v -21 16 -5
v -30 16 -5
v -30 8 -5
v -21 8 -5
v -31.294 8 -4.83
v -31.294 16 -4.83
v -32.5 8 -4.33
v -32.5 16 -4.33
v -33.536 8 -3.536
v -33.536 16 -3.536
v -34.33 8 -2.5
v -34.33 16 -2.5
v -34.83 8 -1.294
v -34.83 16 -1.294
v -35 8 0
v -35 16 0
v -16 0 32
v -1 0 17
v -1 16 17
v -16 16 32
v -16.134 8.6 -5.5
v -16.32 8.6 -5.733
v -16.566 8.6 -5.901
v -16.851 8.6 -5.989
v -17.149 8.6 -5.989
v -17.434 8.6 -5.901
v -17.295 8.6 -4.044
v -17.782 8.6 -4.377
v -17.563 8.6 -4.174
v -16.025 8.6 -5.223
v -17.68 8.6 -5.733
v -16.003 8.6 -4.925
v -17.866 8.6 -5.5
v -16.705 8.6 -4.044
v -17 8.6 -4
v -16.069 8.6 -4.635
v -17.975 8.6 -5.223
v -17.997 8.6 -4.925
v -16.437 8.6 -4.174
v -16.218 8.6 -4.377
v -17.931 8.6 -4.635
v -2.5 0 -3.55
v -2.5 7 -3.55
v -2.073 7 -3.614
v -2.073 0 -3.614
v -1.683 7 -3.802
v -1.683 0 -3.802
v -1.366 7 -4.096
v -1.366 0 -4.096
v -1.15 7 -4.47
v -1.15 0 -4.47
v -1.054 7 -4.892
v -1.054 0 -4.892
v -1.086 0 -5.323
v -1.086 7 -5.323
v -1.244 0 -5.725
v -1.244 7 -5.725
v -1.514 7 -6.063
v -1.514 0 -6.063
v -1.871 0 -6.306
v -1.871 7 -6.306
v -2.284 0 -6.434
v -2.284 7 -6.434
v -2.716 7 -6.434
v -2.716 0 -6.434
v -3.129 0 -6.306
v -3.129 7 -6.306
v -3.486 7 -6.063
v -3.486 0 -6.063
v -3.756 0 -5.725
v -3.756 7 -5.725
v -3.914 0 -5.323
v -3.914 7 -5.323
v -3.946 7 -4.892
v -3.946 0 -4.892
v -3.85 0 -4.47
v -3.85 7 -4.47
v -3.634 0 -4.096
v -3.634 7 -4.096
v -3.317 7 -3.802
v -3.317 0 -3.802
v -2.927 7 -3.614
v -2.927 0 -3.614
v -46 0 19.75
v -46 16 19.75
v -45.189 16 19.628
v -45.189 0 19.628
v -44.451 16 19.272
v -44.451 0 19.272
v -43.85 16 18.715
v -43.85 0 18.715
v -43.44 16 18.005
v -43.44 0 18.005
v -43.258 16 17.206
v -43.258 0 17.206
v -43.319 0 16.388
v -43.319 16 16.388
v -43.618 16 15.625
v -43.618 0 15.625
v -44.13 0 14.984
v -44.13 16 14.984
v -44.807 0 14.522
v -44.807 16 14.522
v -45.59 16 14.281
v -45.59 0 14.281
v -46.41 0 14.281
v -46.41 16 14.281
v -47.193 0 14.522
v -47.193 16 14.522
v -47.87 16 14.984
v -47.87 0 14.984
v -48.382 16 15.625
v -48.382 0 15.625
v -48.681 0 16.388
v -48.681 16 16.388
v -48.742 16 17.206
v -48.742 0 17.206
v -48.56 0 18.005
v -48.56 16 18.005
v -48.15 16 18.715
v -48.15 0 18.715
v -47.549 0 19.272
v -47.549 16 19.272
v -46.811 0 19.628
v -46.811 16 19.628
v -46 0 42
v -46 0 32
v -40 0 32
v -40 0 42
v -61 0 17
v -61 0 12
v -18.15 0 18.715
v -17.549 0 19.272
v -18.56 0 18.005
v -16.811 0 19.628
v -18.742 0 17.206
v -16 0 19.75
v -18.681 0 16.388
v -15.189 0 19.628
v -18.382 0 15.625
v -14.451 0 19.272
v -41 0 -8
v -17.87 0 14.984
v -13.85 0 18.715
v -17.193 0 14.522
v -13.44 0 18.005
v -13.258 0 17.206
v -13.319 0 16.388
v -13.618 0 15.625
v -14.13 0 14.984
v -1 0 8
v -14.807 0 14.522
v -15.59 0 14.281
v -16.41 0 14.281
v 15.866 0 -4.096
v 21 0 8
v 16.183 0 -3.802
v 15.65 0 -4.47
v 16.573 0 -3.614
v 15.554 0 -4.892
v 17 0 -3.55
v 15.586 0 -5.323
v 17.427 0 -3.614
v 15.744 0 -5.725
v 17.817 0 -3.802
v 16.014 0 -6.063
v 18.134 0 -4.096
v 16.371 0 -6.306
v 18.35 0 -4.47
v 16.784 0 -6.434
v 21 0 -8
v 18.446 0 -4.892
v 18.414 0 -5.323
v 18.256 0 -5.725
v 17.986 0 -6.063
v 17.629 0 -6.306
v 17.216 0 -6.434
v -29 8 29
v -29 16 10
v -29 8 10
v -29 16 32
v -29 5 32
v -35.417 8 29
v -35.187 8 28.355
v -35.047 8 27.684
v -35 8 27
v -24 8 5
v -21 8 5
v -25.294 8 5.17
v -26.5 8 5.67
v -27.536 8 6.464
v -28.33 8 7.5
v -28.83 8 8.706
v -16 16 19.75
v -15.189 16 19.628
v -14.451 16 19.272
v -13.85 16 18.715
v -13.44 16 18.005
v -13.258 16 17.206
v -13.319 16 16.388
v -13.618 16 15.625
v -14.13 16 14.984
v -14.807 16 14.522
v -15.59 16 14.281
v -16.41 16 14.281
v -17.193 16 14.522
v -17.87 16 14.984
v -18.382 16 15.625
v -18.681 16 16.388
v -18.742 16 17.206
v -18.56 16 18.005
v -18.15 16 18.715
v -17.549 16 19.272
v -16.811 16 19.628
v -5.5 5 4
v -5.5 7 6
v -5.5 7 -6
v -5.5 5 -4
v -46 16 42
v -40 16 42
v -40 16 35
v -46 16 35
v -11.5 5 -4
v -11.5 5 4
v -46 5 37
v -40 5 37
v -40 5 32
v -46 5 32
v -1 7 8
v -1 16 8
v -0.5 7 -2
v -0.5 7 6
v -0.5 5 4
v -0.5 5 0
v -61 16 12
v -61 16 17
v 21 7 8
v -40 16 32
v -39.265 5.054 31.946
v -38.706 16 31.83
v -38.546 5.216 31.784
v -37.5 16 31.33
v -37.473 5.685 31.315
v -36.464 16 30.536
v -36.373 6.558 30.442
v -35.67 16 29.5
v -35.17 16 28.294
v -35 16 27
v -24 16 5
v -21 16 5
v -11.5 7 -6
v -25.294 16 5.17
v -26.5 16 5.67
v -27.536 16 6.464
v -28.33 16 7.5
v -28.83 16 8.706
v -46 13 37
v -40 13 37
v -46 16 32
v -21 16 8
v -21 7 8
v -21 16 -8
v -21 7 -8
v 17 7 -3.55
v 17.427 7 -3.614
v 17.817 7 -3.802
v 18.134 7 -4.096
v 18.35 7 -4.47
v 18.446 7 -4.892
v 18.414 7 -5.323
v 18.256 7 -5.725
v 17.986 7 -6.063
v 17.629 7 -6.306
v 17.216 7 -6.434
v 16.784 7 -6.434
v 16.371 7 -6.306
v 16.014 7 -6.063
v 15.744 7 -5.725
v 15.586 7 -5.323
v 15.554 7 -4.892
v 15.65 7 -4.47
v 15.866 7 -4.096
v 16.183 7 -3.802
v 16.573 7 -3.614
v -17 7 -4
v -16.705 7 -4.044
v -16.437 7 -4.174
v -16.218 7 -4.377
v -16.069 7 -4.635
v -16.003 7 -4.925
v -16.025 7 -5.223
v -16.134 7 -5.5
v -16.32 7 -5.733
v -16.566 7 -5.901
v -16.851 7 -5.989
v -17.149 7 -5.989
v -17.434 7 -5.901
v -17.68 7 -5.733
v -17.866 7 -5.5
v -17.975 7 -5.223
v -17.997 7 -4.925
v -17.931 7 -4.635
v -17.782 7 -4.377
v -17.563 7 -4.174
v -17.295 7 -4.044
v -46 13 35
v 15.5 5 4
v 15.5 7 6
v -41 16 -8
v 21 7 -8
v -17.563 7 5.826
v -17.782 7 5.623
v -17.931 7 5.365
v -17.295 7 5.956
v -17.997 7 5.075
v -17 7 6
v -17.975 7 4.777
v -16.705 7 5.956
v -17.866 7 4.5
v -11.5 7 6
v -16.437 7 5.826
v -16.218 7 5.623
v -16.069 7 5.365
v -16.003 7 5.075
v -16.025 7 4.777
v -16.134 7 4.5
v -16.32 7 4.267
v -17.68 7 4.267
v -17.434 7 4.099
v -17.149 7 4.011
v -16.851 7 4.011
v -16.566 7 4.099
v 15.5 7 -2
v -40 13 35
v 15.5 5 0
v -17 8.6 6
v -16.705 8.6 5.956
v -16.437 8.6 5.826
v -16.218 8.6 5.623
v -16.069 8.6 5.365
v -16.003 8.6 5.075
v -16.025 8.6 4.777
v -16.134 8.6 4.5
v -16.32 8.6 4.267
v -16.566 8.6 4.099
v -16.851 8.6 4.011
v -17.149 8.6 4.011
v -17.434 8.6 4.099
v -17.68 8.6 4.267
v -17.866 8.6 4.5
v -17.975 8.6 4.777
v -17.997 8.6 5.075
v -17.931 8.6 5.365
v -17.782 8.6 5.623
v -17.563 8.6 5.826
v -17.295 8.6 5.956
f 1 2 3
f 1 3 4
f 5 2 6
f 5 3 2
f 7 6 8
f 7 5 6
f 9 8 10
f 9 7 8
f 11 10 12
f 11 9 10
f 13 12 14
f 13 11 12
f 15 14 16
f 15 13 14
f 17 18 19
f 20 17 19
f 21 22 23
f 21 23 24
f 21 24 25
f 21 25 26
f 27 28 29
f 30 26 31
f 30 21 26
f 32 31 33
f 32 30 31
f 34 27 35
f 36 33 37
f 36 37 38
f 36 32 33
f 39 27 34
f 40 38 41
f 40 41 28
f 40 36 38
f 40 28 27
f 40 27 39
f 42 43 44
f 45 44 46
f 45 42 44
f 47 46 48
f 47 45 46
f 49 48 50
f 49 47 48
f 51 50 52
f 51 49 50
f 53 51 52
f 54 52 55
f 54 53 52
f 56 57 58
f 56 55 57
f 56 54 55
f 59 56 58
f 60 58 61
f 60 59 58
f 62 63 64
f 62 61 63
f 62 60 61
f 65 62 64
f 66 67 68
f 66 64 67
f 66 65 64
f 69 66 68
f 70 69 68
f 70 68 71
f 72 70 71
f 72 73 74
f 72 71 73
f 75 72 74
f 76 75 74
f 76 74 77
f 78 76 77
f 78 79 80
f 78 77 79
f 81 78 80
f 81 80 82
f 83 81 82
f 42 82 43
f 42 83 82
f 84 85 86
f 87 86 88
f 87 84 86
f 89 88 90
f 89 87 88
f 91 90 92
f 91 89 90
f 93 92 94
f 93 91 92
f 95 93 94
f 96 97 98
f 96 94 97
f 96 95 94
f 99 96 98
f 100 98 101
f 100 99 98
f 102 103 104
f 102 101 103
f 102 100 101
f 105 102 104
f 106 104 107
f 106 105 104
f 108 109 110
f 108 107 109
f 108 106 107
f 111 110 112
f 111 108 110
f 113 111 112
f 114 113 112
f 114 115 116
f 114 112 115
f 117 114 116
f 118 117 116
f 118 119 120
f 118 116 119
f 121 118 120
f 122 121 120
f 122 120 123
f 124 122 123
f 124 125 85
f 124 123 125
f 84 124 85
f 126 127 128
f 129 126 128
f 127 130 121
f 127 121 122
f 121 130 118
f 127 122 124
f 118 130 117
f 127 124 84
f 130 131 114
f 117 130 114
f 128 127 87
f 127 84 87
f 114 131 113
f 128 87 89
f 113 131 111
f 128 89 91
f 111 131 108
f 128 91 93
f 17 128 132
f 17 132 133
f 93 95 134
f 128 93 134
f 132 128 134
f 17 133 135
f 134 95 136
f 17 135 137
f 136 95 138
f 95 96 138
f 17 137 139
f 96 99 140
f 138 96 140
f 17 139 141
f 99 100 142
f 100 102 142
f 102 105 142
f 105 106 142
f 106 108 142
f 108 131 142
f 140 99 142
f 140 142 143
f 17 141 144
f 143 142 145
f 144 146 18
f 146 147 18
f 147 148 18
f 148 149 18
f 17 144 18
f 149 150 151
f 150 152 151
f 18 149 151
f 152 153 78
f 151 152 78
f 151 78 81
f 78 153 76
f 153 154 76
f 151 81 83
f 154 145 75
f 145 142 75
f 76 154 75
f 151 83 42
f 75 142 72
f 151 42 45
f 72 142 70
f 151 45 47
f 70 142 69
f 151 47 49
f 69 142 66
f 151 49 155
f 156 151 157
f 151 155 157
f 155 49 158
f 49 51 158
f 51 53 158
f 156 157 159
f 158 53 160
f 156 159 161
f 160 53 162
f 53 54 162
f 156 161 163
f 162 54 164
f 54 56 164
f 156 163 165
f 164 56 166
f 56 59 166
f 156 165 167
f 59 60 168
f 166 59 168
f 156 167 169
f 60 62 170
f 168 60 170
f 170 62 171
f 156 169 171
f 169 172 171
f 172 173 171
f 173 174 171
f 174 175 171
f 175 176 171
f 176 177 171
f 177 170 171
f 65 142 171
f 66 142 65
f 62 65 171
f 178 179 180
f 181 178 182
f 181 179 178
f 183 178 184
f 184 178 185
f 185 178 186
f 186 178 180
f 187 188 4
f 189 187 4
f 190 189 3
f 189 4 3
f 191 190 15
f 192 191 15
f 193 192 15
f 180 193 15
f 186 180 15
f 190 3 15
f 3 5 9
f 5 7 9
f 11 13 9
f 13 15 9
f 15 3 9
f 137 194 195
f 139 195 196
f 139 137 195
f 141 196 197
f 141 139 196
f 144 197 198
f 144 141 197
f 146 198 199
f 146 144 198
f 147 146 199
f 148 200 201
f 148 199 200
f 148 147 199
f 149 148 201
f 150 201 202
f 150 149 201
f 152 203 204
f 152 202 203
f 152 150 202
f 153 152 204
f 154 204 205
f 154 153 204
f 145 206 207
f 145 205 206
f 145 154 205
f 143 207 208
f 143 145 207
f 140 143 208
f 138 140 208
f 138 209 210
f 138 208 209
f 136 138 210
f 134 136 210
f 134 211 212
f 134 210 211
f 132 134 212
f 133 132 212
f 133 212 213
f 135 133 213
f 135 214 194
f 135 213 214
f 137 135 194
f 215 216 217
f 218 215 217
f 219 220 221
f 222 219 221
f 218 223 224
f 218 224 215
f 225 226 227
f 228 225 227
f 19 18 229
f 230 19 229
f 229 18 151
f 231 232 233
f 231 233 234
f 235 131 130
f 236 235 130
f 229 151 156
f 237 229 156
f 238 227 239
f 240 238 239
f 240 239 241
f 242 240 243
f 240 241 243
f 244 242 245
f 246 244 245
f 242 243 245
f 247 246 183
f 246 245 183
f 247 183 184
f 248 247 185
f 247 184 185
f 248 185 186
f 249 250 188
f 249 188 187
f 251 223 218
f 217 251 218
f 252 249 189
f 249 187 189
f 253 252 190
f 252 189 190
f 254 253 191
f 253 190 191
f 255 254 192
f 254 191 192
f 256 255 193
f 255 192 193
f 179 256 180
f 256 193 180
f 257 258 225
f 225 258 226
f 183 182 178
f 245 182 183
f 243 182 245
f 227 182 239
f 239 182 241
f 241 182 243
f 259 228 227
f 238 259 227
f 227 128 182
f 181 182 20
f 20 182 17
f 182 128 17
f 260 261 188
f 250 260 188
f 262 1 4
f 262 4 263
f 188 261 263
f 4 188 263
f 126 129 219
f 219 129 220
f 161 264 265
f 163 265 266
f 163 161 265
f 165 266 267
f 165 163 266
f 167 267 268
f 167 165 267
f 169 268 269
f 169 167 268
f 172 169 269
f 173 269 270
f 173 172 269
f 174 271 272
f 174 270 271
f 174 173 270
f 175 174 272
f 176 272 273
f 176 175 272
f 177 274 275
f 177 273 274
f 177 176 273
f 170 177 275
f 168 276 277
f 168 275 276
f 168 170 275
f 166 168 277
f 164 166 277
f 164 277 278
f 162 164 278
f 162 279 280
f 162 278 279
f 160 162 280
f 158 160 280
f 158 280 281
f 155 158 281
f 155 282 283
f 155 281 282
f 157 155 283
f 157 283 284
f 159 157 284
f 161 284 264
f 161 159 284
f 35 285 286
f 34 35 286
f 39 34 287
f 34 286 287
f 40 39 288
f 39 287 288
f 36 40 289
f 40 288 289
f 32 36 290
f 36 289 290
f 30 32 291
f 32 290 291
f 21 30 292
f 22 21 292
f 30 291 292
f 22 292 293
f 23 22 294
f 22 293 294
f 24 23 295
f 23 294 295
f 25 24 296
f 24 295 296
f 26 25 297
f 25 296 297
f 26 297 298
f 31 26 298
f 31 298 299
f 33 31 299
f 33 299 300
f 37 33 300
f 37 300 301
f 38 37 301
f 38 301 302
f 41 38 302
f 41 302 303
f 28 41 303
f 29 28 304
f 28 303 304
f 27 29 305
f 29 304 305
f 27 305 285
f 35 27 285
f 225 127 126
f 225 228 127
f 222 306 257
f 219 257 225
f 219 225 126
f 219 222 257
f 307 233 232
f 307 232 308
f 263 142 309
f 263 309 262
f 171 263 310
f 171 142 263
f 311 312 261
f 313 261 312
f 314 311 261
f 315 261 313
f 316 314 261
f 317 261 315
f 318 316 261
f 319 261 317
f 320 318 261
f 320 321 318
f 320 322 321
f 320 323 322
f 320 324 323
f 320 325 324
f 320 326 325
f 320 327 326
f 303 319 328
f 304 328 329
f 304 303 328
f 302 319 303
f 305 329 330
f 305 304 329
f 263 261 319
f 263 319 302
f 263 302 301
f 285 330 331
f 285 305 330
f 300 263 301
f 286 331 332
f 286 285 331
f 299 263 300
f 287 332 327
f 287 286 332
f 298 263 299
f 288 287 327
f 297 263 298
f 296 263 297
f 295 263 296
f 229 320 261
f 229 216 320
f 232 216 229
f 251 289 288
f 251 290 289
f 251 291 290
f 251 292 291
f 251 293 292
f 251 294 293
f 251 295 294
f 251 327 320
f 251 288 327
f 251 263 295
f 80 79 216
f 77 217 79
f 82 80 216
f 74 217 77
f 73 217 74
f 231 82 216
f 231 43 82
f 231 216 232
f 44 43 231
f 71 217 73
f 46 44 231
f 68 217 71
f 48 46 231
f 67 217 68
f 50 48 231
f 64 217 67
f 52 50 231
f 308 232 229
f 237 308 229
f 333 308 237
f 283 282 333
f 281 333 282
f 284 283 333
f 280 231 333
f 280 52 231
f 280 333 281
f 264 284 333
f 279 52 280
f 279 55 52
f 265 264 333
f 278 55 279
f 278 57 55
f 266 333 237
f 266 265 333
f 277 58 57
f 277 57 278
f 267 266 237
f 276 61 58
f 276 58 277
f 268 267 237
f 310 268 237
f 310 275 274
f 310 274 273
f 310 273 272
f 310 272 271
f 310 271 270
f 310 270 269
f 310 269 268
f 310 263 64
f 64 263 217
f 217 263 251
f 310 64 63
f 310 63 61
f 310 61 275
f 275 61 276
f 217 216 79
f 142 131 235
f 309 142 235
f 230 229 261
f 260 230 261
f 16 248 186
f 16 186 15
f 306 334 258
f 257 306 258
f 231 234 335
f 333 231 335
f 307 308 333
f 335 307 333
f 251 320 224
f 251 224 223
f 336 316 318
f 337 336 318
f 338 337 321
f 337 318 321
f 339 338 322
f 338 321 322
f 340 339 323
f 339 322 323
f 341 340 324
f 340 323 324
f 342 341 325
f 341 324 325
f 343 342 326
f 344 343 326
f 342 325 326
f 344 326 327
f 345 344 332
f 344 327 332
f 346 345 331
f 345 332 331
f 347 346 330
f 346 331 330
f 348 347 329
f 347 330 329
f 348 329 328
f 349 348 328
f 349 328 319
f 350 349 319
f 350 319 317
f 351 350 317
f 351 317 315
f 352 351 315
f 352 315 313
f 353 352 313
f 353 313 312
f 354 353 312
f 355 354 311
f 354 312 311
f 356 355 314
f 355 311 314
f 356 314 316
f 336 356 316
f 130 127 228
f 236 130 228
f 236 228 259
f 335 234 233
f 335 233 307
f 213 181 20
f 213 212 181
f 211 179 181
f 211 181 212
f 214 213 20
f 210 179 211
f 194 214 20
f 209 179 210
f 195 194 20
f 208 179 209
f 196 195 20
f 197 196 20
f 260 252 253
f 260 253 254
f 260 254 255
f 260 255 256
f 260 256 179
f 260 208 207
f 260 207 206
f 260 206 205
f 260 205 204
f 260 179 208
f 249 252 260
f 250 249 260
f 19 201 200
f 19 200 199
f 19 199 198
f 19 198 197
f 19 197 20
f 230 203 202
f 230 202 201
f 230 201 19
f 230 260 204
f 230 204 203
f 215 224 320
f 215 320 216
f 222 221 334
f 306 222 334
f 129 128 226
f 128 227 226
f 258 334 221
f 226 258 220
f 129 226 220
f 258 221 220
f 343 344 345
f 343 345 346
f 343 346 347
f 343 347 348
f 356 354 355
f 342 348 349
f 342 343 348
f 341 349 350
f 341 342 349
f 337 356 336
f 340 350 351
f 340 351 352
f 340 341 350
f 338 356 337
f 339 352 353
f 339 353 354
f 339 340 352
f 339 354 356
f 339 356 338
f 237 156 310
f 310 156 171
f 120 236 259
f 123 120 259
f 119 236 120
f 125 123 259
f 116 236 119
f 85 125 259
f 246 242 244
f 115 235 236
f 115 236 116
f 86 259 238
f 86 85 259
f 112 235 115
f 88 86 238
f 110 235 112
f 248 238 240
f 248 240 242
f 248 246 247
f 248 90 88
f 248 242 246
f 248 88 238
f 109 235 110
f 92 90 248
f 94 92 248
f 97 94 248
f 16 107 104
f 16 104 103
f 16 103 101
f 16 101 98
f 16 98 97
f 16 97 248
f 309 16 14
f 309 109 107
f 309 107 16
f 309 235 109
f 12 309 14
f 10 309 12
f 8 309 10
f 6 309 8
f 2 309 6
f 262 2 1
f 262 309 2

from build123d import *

# Parameters (mm, degrees)
SKETCH1_W           = 42
SKETCH1_H           = 16
BOSS_EXTRUDE1_DEPTH = 7
SKETCH2_R           = 1
BOSS_EXTRUDE2_DEPTH = 1.6
CUT_EXTRUDE1_REACH  = 26.062
SKETCH3_R           = 1.45
BOSS_EXTRUDE3_DEPTH = 16
CUT_EXTRUDE2_REACH  = 72.718
SKETCH5_R           = 2.75
BOSS_EXTRUDE4_DEPTH = 6
CUT_EXTRUDE3_DEPTH  = 8
FILLET1_R           = 5
CHAMFER2_SIZE       = 3
CHAMFER3_SIZE       = 15
CHAMFER5_SIZE       = 20
SKETCH8_W           = 16
SKETCH8_H           = 4
SKETCH8_W_2         = 6
SKETCH8_H_2         = 10
CUT_EXTRUDE4_DEPTH  = 2
CHAMFER6_SIZE       = 2


with BuildPart() as part:
    # Sketch1 → Boss-Extrude1 (new body)
    with BuildSketch(Plane(origin=(0, 0, 0), x_dir=(1, 0, 0), z_dir=(0, 1, 0))):
        Rectangle(SKETCH1_W, SKETCH1_H)
    extrude(amount=BOSS_EXTRUDE1_DEPTH)

    # Sketch2 → Boss-Extrude2 (add)
    with BuildSketch(Plane(origin=(0, 7, 0), x_dir=(1, 0, 0), z_dir=(0, 1, 0))):
        with Locations(Location((-17, 5, 0), (0, 0, 270))):
            Circle(SKETCH2_R)
        with Locations(Location((-17, -5, 0), (0, 0, 270))):
            Circle(SKETCH2_R)
    extrude(amount=BOSS_EXTRUDE2_DEPTH)

    # Sketch3 → Cut-Extrude1 (cut, up to next)
    with BuildSketch(Plane(origin=(0, 0, 0), x_dir=(1, 0, 0), z_dir=(0, 1, 0)), mode=Mode.PRIVATE) as cut_extrude1_sk1:
        with Locations(Location((-2.5, 5, 0), (0, 0, 270))):
            Circle(SKETCH3_R)
    cut_extrude1_tool1 = extrude(cut_extrude1_sk1.sketch, amount=CUT_EXTRUDE1_REACH, mode=Mode.PRIVATE) & part.part
    # Sketch3 → Cut-Extrude1 (cut, up to next)
    with BuildSketch(Plane(origin=(0, 0, 0), x_dir=(1, 0, 0), z_dir=(0, 1, 0)), mode=Mode.PRIVATE) as cut_extrude1_sk2:
        with Locations(Location((17, 5, 0), (0, 0, 270))):
            Circle(SKETCH3_R)
    cut_extrude1_tool2 = extrude(cut_extrude1_sk2.sketch, amount=CUT_EXTRUDE1_REACH, mode=Mode.PRIVATE) & part.part
    add(cut_extrude1_tool1.solids().sort_by_distance((-2.5, 0, -5))[0], mode=Mode.SUBTRACT)
    add(cut_extrude1_tool2.solids().sort_by_distance((17, 0, -5))[0], mode=Mode.SUBTRACT)

    # Sketch4 → Boss-Extrude3 (add)
    with BuildSketch(Plane(origin=(0, 0, 0), x_dir=(1, 0, 0), z_dir=(0, 1, 0))):
        Polygon((-1, -8), (-21, -8), (-21, 8), (-61, 8), (-61, -32), (-1, -32), align=None)
    extrude(amount=BOSS_EXTRUDE3_DEPTH)

    # Sketch5 → Cut-Extrude2 (cut, up to next)
    with BuildSketch(Plane(origin=(0, 0, 0), x_dir=(1, 0, 0), z_dir=(0, 1, 0)), mode=Mode.PRIVATE) as cut_extrude2_sk1:
        with Locations(Location((-46, -17, 0), (0, 0, 270))):
            Circle(SKETCH5_R)
    cut_extrude2_tool1 = extrude(cut_extrude2_sk1.sketch, amount=CUT_EXTRUDE2_REACH, mode=Mode.PRIVATE) & part.part
    # Sketch5 → Cut-Extrude2 (cut, up to next)
    with BuildSketch(Plane(origin=(0, 0, 0), x_dir=(1, 0, 0), z_dir=(0, 1, 0)), mode=Mode.PRIVATE) as cut_extrude2_sk2:
        with Locations(Location((-16, -17, 0), (0, 0, 270))):
            Circle(SKETCH5_R)
    cut_extrude2_tool2 = extrude(cut_extrude2_sk2.sketch, amount=CUT_EXTRUDE2_REACH, mode=Mode.PRIVATE) & part.part
    add(cut_extrude2_tool1.solids().sort_by_distance((-46, 0, 17))[0], mode=Mode.SUBTRACT)
    add(cut_extrude2_tool2.solids().sort_by_distance((-16, 0, 17))[0], mode=Mode.SUBTRACT)

    # Sketch6 → Boss-Extrude4 (add)
    with BuildSketch(Plane(origin=(-40, 0, 0), x_dir=(0, 0, -1), z_dir=(1, 0, 0))):
        Polygon((-32, 0), (-42, 0), (-42, 16), (-35, 16), (-35, 13), (-37, 13), (-37, 5), (-32, 5), align=None)
    extrude(amount=-BOSS_EXTRUDE4_DEPTH)

    # Sketch7 → Cut-Extrude3 (cut)
    with BuildSketch(Plane(origin=(0, 16, 0), x_dir=(1, 0, 0), z_dir=(0, 1, 0))):
        Polygon((-21, 5), (-21, -5), (-29, -5), (-29, -32), (-35, -32), (-35, 5), align=None)
    extrude(amount=-CUT_EXTRUDE3_DEPTH, mode=Mode.SUBTRACT)

    # Fillet1
    fillet1_edges = [part.edges().sort_by_distance(p)[0] for p in [
        (-35, 12, -5),
        (-29, 12, 5),
        (-35, 12, 32),
    ]]
    fillet(fillet1_edges, radius=FILLET1_R)

    # Chamfer2
    chamfer2_edges = [part.edges().sort_by_distance(p)[0] for p in [
        (-34.5, 8, 32),
    ]]
    chamfer(chamfer2_edges, length=CHAMFER2_SIZE)

    # Chamfer3
    chamfer3_edges = [part.edges().sort_by_distance(p)[0] for p in [
        (-1, 8, 32),
        (-61, 8, 32),
    ]]
    chamfer(chamfer3_edges, length=CHAMFER3_SIZE)

    # Chamfer5
    chamfer5_edges = [part.edges().sort_by_distance(p)[0] for p in [
        (-61, 8, -8),
    ]]
    chamfer(chamfer5_edges, length=CHAMFER5_SIZE)

    # Sketch8 → Cut-Extrude4 (cut)
    with BuildSketch(Plane(origin=(0, 7, 0), x_dir=(1, 0, 0), z_dir=(0, 1, 0))):
        with Locations((7.5, -2)):
            Rectangle(SKETCH8_W, SKETCH8_H)
        with Locations((-8.5, 1)):
            Rectangle(SKETCH8_W_2, SKETCH8_H_2)
    extrude(amount=-CUT_EXTRUDE4_DEPTH, mode=Mode.SUBTRACT)

    # Chamfer6
    chamfer6_edges = [part.edges().sort_by_distance(p)[0] for p in [
        (7.5, 7, 4),
        (7.5, 7, 0),
        (-8.5, 7, 4),
        (-8.5, 5, -6),
    ]]
    chamfer(chamfer6_edges, length=CHAMFER6_SIZE - 0.0001)  # a hair under: the kernel refuses the full size


solid = part.part
